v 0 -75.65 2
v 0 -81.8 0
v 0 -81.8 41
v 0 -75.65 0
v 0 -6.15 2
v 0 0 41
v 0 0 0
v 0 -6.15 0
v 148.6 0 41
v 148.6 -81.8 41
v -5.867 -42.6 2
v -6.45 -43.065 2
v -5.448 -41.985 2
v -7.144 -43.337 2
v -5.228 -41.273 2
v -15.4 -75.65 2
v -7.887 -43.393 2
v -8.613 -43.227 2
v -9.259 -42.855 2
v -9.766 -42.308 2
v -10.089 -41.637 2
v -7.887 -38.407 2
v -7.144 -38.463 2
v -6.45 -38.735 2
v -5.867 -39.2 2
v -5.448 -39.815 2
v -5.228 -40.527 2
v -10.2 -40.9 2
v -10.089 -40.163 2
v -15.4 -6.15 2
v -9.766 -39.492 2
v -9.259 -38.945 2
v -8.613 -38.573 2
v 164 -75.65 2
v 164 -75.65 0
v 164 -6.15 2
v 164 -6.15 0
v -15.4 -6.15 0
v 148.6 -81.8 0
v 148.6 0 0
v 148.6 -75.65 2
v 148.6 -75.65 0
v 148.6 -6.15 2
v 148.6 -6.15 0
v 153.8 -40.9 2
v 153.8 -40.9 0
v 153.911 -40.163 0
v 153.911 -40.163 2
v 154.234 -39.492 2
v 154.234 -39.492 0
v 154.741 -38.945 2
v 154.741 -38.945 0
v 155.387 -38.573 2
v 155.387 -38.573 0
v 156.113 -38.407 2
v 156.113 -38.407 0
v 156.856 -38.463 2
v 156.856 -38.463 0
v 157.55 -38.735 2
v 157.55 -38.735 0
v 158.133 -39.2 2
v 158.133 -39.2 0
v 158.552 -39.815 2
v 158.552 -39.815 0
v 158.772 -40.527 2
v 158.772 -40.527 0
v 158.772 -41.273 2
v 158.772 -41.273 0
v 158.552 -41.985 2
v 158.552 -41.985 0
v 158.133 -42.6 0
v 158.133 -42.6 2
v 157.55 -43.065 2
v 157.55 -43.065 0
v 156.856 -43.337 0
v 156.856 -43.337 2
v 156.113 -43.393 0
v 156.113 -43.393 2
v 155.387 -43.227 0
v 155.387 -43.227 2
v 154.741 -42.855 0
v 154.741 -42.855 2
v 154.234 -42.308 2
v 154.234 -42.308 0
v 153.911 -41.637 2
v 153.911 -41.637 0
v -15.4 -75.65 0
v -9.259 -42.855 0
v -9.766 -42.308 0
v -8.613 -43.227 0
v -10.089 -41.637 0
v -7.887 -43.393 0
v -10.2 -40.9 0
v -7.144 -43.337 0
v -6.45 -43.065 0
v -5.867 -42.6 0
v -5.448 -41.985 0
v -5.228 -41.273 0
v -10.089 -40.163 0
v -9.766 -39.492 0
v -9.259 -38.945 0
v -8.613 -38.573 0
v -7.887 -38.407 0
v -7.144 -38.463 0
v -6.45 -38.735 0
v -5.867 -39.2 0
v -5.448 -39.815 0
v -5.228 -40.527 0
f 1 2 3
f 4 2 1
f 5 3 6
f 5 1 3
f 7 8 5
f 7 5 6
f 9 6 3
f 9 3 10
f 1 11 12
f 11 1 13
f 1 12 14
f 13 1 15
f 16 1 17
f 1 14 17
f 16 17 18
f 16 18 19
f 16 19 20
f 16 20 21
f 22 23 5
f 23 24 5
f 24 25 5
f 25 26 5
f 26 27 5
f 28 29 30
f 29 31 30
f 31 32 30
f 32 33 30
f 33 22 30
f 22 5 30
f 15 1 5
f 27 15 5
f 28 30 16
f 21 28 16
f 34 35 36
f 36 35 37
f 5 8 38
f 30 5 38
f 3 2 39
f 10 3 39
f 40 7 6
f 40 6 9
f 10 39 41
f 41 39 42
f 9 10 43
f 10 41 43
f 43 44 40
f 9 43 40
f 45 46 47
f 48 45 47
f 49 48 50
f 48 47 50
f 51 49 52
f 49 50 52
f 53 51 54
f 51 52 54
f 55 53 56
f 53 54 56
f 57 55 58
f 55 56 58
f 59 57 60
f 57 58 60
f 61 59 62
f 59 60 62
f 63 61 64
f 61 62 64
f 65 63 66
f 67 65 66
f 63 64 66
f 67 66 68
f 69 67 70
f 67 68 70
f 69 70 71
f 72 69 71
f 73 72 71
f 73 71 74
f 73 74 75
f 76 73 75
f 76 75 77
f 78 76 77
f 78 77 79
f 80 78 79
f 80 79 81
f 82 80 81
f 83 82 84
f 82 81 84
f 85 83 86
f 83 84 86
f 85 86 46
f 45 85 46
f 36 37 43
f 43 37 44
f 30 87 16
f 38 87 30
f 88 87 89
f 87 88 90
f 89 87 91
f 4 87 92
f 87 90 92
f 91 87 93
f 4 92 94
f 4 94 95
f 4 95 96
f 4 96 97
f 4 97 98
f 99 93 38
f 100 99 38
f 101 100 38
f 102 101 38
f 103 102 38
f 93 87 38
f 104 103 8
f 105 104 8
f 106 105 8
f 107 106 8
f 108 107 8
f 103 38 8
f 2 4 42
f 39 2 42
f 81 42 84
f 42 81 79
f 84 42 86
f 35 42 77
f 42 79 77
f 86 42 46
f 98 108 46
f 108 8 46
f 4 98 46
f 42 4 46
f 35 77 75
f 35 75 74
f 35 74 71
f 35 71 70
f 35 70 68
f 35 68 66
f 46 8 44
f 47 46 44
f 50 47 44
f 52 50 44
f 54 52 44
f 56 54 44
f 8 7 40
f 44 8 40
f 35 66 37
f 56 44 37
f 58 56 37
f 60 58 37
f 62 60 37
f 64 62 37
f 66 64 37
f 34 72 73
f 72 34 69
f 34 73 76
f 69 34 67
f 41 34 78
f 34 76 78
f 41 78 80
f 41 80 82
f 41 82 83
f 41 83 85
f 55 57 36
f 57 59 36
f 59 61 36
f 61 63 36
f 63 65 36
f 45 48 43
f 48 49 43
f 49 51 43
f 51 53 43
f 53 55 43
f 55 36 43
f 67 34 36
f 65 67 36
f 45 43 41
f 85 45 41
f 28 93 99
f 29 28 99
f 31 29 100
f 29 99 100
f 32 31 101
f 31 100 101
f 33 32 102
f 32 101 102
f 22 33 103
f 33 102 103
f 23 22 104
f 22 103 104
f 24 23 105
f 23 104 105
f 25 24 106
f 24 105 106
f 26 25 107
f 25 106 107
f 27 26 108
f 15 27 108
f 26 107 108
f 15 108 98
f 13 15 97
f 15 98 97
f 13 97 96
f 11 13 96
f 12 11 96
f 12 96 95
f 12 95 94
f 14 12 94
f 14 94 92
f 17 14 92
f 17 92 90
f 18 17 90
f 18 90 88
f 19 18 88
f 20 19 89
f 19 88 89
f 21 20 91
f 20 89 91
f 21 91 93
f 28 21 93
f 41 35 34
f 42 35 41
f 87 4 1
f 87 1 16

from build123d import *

# Parameters (mm, degrees)
SKETCH1_W           = 148.6
SKETCH1_H           = 81.8
BOSS_EXTRUDE1_DEPTH = 41
SKETCH2_W           = 15.4
SKETCH2_H           = 69.5
SKETCH2_R           = 2.5
BOSS_EXTRUDE2_DEPTH = 2


with BuildPart() as part:
    # Sketch1 → Boss-Extrude1 (new body)
    with BuildSketch(Plane.XY):
        with Locations((74.3, -40.9)):
            Rectangle(SKETCH1_W, SKETCH1_H)
    extrude(amount=BOSS_EXTRUDE1_DEPTH)

    # Sketch2 → Boss-Extrude2 (add)
    with BuildSketch(Plane(origin=(0, 0, 0), x_dir=(-1, 0, 0), z_dir=(0, 0, -1))):
        with Locations((7.7, -40.9)):
            Rectangle(SKETCH2_W, SKETCH2_H)
        with Locations((7.7, -40.9)):
            Circle(SKETCH2_R, mode=Mode.SUBTRACT)
        with Locations((-156.3, -40.9)):
            Rectangle(SKETCH2_W, SKETCH2_H)
        with Locations((-156.3, -40.9)):
            Circle(SKETCH2_R, mode=Mode.SUBTRACT)
    extrude(amount=-BOSS_EXTRUDE2_DEPTH)


solid = part.part
